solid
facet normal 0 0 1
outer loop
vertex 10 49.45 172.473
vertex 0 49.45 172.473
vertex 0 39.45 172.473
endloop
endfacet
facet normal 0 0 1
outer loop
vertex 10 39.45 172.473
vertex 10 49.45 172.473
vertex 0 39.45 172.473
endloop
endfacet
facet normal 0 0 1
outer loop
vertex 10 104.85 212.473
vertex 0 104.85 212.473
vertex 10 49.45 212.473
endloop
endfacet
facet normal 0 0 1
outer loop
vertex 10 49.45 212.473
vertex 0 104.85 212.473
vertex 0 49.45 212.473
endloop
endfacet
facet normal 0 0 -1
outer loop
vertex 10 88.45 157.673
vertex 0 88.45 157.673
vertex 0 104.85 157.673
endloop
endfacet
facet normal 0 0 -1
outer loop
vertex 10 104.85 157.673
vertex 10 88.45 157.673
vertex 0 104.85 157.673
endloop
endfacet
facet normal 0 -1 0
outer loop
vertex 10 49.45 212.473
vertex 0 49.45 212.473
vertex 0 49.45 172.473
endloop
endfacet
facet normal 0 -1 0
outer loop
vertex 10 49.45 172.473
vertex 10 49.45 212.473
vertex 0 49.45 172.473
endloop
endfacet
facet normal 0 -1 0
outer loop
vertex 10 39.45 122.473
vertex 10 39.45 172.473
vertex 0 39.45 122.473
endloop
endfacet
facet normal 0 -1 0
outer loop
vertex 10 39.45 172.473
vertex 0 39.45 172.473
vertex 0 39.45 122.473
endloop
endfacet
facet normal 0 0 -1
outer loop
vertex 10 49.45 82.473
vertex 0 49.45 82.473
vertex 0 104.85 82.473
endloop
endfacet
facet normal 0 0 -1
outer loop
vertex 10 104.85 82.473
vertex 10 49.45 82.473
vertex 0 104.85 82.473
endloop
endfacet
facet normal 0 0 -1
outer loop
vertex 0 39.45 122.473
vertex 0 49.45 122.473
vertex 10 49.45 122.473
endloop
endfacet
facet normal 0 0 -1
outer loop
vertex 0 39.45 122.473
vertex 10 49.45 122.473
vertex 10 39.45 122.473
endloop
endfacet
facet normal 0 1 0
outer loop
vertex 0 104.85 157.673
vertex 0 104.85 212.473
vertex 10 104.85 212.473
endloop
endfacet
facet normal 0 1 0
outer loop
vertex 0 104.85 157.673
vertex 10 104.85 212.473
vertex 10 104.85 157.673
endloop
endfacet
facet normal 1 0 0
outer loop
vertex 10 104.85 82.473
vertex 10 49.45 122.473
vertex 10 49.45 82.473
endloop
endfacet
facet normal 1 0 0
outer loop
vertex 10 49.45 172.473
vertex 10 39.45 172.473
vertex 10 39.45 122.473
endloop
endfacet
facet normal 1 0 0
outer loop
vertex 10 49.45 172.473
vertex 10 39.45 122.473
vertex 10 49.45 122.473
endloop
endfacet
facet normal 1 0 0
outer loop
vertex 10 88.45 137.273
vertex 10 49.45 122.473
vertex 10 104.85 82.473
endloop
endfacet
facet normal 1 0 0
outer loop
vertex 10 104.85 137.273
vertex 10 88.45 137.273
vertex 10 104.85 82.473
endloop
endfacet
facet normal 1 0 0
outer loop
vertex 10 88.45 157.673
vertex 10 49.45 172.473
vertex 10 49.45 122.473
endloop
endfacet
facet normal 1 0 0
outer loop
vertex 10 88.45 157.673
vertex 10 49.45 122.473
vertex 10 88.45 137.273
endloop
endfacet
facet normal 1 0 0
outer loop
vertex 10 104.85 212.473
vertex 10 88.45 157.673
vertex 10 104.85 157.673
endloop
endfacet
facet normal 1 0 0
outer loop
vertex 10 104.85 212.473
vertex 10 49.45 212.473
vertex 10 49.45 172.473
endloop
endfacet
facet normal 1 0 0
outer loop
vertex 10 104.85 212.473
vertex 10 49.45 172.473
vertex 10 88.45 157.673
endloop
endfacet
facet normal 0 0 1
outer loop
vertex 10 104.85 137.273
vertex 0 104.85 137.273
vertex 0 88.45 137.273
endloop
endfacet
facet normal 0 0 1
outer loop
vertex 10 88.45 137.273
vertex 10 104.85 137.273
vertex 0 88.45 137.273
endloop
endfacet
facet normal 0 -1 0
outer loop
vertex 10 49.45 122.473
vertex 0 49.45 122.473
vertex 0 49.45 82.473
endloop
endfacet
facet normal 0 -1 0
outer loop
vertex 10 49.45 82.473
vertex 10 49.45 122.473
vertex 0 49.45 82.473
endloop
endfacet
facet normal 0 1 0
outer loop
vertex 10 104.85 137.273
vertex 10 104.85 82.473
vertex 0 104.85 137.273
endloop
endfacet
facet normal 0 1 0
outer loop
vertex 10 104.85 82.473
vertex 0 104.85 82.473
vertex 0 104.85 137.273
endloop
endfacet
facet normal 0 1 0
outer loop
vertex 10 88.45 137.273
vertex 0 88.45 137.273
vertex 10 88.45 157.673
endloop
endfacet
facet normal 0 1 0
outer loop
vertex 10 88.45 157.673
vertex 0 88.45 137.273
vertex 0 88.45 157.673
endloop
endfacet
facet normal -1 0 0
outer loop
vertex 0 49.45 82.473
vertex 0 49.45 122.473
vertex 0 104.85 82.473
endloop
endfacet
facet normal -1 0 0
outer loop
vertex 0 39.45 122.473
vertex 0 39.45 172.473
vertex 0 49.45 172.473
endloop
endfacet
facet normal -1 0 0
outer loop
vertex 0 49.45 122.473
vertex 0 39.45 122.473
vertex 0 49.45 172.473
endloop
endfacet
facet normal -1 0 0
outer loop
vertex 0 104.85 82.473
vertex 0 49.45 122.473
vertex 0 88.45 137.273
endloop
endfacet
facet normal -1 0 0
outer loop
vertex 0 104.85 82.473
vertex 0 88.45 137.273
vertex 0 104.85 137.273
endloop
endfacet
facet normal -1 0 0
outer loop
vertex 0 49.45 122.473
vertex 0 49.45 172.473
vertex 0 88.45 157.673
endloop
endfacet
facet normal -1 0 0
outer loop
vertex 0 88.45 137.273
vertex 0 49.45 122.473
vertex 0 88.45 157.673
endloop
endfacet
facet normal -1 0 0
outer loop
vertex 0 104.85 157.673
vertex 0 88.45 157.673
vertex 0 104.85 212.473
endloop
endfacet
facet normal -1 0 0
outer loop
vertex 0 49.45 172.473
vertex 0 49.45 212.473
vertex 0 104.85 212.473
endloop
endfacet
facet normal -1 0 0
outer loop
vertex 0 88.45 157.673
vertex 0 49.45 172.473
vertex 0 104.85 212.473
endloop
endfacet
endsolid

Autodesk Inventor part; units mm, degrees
ref_plane "YZ Plane" through (0, 0, 0) normal (1, 0, 0) x (0, 1, 0)
ref_plane "XZ Plane" through (0, 0, 0) normal (0, 1, 0) x (-1, 0, 0)
ref_plane "XY Plane" through (0, 0, 0) normal (0, 0, 1) x (1, 0, 0)
sketch "Sketch1" plane through (0, 0, 0) normal (1, 0, 0) x (0, 1, 0)
  line L0 (104.8505, 212.4728) -> (49.4505, 212.4728)
  line L1 (49.4505, 212.4728) -> (49.4505, 172.4728)
  line L2 (49.4505, 122.4728) -> (49.4505, 82.4728)
  line L3 (49.4505, 82.4728) -> (104.8505, 82.4728)
  line L4 (104.8505, 82.4728) -> (104.8505, 137.2728)
  line L5 (104.8505, 137.2728) -> (88.4505, 137.2728)
  line L6 (88.4505, 137.2728) -> (88.4505, 157.6728)
  line L7 (88.4505, 157.6728) -> (104.8505, 157.6728)
  line L8 (104.8505, 212.4728) -> (104.8505, 157.6728)
  line L9 (39.4505, 147.4728) -> (88.4505, 147.4728) construction
  line L10 (39.4505, 172.4728) -> (39.4505, 122.4728)
  line L11 (49.4505, 122.4728) -> (39.4505, 122.4728)
  line L12 (49.4505, 172.4728) -> (39.4505, 172.4728)
  point P0 (0, 0)
  dimension "d0" = 10
  dimension "d3" = 55.4
  dimension "d4" = 130
  dimension "d8" = 20.4
  dimension "d9" = 50
  dimension "d10" = 16.4
extrude "Extrusion1" add sketch "Sketch1" along normal blind 10
equation "\"d0\" = Width"
equation "\"d5\" = Width"
equation "\"Width\" = 10"
properties part number "BackWall" material "ABS Plastic"
